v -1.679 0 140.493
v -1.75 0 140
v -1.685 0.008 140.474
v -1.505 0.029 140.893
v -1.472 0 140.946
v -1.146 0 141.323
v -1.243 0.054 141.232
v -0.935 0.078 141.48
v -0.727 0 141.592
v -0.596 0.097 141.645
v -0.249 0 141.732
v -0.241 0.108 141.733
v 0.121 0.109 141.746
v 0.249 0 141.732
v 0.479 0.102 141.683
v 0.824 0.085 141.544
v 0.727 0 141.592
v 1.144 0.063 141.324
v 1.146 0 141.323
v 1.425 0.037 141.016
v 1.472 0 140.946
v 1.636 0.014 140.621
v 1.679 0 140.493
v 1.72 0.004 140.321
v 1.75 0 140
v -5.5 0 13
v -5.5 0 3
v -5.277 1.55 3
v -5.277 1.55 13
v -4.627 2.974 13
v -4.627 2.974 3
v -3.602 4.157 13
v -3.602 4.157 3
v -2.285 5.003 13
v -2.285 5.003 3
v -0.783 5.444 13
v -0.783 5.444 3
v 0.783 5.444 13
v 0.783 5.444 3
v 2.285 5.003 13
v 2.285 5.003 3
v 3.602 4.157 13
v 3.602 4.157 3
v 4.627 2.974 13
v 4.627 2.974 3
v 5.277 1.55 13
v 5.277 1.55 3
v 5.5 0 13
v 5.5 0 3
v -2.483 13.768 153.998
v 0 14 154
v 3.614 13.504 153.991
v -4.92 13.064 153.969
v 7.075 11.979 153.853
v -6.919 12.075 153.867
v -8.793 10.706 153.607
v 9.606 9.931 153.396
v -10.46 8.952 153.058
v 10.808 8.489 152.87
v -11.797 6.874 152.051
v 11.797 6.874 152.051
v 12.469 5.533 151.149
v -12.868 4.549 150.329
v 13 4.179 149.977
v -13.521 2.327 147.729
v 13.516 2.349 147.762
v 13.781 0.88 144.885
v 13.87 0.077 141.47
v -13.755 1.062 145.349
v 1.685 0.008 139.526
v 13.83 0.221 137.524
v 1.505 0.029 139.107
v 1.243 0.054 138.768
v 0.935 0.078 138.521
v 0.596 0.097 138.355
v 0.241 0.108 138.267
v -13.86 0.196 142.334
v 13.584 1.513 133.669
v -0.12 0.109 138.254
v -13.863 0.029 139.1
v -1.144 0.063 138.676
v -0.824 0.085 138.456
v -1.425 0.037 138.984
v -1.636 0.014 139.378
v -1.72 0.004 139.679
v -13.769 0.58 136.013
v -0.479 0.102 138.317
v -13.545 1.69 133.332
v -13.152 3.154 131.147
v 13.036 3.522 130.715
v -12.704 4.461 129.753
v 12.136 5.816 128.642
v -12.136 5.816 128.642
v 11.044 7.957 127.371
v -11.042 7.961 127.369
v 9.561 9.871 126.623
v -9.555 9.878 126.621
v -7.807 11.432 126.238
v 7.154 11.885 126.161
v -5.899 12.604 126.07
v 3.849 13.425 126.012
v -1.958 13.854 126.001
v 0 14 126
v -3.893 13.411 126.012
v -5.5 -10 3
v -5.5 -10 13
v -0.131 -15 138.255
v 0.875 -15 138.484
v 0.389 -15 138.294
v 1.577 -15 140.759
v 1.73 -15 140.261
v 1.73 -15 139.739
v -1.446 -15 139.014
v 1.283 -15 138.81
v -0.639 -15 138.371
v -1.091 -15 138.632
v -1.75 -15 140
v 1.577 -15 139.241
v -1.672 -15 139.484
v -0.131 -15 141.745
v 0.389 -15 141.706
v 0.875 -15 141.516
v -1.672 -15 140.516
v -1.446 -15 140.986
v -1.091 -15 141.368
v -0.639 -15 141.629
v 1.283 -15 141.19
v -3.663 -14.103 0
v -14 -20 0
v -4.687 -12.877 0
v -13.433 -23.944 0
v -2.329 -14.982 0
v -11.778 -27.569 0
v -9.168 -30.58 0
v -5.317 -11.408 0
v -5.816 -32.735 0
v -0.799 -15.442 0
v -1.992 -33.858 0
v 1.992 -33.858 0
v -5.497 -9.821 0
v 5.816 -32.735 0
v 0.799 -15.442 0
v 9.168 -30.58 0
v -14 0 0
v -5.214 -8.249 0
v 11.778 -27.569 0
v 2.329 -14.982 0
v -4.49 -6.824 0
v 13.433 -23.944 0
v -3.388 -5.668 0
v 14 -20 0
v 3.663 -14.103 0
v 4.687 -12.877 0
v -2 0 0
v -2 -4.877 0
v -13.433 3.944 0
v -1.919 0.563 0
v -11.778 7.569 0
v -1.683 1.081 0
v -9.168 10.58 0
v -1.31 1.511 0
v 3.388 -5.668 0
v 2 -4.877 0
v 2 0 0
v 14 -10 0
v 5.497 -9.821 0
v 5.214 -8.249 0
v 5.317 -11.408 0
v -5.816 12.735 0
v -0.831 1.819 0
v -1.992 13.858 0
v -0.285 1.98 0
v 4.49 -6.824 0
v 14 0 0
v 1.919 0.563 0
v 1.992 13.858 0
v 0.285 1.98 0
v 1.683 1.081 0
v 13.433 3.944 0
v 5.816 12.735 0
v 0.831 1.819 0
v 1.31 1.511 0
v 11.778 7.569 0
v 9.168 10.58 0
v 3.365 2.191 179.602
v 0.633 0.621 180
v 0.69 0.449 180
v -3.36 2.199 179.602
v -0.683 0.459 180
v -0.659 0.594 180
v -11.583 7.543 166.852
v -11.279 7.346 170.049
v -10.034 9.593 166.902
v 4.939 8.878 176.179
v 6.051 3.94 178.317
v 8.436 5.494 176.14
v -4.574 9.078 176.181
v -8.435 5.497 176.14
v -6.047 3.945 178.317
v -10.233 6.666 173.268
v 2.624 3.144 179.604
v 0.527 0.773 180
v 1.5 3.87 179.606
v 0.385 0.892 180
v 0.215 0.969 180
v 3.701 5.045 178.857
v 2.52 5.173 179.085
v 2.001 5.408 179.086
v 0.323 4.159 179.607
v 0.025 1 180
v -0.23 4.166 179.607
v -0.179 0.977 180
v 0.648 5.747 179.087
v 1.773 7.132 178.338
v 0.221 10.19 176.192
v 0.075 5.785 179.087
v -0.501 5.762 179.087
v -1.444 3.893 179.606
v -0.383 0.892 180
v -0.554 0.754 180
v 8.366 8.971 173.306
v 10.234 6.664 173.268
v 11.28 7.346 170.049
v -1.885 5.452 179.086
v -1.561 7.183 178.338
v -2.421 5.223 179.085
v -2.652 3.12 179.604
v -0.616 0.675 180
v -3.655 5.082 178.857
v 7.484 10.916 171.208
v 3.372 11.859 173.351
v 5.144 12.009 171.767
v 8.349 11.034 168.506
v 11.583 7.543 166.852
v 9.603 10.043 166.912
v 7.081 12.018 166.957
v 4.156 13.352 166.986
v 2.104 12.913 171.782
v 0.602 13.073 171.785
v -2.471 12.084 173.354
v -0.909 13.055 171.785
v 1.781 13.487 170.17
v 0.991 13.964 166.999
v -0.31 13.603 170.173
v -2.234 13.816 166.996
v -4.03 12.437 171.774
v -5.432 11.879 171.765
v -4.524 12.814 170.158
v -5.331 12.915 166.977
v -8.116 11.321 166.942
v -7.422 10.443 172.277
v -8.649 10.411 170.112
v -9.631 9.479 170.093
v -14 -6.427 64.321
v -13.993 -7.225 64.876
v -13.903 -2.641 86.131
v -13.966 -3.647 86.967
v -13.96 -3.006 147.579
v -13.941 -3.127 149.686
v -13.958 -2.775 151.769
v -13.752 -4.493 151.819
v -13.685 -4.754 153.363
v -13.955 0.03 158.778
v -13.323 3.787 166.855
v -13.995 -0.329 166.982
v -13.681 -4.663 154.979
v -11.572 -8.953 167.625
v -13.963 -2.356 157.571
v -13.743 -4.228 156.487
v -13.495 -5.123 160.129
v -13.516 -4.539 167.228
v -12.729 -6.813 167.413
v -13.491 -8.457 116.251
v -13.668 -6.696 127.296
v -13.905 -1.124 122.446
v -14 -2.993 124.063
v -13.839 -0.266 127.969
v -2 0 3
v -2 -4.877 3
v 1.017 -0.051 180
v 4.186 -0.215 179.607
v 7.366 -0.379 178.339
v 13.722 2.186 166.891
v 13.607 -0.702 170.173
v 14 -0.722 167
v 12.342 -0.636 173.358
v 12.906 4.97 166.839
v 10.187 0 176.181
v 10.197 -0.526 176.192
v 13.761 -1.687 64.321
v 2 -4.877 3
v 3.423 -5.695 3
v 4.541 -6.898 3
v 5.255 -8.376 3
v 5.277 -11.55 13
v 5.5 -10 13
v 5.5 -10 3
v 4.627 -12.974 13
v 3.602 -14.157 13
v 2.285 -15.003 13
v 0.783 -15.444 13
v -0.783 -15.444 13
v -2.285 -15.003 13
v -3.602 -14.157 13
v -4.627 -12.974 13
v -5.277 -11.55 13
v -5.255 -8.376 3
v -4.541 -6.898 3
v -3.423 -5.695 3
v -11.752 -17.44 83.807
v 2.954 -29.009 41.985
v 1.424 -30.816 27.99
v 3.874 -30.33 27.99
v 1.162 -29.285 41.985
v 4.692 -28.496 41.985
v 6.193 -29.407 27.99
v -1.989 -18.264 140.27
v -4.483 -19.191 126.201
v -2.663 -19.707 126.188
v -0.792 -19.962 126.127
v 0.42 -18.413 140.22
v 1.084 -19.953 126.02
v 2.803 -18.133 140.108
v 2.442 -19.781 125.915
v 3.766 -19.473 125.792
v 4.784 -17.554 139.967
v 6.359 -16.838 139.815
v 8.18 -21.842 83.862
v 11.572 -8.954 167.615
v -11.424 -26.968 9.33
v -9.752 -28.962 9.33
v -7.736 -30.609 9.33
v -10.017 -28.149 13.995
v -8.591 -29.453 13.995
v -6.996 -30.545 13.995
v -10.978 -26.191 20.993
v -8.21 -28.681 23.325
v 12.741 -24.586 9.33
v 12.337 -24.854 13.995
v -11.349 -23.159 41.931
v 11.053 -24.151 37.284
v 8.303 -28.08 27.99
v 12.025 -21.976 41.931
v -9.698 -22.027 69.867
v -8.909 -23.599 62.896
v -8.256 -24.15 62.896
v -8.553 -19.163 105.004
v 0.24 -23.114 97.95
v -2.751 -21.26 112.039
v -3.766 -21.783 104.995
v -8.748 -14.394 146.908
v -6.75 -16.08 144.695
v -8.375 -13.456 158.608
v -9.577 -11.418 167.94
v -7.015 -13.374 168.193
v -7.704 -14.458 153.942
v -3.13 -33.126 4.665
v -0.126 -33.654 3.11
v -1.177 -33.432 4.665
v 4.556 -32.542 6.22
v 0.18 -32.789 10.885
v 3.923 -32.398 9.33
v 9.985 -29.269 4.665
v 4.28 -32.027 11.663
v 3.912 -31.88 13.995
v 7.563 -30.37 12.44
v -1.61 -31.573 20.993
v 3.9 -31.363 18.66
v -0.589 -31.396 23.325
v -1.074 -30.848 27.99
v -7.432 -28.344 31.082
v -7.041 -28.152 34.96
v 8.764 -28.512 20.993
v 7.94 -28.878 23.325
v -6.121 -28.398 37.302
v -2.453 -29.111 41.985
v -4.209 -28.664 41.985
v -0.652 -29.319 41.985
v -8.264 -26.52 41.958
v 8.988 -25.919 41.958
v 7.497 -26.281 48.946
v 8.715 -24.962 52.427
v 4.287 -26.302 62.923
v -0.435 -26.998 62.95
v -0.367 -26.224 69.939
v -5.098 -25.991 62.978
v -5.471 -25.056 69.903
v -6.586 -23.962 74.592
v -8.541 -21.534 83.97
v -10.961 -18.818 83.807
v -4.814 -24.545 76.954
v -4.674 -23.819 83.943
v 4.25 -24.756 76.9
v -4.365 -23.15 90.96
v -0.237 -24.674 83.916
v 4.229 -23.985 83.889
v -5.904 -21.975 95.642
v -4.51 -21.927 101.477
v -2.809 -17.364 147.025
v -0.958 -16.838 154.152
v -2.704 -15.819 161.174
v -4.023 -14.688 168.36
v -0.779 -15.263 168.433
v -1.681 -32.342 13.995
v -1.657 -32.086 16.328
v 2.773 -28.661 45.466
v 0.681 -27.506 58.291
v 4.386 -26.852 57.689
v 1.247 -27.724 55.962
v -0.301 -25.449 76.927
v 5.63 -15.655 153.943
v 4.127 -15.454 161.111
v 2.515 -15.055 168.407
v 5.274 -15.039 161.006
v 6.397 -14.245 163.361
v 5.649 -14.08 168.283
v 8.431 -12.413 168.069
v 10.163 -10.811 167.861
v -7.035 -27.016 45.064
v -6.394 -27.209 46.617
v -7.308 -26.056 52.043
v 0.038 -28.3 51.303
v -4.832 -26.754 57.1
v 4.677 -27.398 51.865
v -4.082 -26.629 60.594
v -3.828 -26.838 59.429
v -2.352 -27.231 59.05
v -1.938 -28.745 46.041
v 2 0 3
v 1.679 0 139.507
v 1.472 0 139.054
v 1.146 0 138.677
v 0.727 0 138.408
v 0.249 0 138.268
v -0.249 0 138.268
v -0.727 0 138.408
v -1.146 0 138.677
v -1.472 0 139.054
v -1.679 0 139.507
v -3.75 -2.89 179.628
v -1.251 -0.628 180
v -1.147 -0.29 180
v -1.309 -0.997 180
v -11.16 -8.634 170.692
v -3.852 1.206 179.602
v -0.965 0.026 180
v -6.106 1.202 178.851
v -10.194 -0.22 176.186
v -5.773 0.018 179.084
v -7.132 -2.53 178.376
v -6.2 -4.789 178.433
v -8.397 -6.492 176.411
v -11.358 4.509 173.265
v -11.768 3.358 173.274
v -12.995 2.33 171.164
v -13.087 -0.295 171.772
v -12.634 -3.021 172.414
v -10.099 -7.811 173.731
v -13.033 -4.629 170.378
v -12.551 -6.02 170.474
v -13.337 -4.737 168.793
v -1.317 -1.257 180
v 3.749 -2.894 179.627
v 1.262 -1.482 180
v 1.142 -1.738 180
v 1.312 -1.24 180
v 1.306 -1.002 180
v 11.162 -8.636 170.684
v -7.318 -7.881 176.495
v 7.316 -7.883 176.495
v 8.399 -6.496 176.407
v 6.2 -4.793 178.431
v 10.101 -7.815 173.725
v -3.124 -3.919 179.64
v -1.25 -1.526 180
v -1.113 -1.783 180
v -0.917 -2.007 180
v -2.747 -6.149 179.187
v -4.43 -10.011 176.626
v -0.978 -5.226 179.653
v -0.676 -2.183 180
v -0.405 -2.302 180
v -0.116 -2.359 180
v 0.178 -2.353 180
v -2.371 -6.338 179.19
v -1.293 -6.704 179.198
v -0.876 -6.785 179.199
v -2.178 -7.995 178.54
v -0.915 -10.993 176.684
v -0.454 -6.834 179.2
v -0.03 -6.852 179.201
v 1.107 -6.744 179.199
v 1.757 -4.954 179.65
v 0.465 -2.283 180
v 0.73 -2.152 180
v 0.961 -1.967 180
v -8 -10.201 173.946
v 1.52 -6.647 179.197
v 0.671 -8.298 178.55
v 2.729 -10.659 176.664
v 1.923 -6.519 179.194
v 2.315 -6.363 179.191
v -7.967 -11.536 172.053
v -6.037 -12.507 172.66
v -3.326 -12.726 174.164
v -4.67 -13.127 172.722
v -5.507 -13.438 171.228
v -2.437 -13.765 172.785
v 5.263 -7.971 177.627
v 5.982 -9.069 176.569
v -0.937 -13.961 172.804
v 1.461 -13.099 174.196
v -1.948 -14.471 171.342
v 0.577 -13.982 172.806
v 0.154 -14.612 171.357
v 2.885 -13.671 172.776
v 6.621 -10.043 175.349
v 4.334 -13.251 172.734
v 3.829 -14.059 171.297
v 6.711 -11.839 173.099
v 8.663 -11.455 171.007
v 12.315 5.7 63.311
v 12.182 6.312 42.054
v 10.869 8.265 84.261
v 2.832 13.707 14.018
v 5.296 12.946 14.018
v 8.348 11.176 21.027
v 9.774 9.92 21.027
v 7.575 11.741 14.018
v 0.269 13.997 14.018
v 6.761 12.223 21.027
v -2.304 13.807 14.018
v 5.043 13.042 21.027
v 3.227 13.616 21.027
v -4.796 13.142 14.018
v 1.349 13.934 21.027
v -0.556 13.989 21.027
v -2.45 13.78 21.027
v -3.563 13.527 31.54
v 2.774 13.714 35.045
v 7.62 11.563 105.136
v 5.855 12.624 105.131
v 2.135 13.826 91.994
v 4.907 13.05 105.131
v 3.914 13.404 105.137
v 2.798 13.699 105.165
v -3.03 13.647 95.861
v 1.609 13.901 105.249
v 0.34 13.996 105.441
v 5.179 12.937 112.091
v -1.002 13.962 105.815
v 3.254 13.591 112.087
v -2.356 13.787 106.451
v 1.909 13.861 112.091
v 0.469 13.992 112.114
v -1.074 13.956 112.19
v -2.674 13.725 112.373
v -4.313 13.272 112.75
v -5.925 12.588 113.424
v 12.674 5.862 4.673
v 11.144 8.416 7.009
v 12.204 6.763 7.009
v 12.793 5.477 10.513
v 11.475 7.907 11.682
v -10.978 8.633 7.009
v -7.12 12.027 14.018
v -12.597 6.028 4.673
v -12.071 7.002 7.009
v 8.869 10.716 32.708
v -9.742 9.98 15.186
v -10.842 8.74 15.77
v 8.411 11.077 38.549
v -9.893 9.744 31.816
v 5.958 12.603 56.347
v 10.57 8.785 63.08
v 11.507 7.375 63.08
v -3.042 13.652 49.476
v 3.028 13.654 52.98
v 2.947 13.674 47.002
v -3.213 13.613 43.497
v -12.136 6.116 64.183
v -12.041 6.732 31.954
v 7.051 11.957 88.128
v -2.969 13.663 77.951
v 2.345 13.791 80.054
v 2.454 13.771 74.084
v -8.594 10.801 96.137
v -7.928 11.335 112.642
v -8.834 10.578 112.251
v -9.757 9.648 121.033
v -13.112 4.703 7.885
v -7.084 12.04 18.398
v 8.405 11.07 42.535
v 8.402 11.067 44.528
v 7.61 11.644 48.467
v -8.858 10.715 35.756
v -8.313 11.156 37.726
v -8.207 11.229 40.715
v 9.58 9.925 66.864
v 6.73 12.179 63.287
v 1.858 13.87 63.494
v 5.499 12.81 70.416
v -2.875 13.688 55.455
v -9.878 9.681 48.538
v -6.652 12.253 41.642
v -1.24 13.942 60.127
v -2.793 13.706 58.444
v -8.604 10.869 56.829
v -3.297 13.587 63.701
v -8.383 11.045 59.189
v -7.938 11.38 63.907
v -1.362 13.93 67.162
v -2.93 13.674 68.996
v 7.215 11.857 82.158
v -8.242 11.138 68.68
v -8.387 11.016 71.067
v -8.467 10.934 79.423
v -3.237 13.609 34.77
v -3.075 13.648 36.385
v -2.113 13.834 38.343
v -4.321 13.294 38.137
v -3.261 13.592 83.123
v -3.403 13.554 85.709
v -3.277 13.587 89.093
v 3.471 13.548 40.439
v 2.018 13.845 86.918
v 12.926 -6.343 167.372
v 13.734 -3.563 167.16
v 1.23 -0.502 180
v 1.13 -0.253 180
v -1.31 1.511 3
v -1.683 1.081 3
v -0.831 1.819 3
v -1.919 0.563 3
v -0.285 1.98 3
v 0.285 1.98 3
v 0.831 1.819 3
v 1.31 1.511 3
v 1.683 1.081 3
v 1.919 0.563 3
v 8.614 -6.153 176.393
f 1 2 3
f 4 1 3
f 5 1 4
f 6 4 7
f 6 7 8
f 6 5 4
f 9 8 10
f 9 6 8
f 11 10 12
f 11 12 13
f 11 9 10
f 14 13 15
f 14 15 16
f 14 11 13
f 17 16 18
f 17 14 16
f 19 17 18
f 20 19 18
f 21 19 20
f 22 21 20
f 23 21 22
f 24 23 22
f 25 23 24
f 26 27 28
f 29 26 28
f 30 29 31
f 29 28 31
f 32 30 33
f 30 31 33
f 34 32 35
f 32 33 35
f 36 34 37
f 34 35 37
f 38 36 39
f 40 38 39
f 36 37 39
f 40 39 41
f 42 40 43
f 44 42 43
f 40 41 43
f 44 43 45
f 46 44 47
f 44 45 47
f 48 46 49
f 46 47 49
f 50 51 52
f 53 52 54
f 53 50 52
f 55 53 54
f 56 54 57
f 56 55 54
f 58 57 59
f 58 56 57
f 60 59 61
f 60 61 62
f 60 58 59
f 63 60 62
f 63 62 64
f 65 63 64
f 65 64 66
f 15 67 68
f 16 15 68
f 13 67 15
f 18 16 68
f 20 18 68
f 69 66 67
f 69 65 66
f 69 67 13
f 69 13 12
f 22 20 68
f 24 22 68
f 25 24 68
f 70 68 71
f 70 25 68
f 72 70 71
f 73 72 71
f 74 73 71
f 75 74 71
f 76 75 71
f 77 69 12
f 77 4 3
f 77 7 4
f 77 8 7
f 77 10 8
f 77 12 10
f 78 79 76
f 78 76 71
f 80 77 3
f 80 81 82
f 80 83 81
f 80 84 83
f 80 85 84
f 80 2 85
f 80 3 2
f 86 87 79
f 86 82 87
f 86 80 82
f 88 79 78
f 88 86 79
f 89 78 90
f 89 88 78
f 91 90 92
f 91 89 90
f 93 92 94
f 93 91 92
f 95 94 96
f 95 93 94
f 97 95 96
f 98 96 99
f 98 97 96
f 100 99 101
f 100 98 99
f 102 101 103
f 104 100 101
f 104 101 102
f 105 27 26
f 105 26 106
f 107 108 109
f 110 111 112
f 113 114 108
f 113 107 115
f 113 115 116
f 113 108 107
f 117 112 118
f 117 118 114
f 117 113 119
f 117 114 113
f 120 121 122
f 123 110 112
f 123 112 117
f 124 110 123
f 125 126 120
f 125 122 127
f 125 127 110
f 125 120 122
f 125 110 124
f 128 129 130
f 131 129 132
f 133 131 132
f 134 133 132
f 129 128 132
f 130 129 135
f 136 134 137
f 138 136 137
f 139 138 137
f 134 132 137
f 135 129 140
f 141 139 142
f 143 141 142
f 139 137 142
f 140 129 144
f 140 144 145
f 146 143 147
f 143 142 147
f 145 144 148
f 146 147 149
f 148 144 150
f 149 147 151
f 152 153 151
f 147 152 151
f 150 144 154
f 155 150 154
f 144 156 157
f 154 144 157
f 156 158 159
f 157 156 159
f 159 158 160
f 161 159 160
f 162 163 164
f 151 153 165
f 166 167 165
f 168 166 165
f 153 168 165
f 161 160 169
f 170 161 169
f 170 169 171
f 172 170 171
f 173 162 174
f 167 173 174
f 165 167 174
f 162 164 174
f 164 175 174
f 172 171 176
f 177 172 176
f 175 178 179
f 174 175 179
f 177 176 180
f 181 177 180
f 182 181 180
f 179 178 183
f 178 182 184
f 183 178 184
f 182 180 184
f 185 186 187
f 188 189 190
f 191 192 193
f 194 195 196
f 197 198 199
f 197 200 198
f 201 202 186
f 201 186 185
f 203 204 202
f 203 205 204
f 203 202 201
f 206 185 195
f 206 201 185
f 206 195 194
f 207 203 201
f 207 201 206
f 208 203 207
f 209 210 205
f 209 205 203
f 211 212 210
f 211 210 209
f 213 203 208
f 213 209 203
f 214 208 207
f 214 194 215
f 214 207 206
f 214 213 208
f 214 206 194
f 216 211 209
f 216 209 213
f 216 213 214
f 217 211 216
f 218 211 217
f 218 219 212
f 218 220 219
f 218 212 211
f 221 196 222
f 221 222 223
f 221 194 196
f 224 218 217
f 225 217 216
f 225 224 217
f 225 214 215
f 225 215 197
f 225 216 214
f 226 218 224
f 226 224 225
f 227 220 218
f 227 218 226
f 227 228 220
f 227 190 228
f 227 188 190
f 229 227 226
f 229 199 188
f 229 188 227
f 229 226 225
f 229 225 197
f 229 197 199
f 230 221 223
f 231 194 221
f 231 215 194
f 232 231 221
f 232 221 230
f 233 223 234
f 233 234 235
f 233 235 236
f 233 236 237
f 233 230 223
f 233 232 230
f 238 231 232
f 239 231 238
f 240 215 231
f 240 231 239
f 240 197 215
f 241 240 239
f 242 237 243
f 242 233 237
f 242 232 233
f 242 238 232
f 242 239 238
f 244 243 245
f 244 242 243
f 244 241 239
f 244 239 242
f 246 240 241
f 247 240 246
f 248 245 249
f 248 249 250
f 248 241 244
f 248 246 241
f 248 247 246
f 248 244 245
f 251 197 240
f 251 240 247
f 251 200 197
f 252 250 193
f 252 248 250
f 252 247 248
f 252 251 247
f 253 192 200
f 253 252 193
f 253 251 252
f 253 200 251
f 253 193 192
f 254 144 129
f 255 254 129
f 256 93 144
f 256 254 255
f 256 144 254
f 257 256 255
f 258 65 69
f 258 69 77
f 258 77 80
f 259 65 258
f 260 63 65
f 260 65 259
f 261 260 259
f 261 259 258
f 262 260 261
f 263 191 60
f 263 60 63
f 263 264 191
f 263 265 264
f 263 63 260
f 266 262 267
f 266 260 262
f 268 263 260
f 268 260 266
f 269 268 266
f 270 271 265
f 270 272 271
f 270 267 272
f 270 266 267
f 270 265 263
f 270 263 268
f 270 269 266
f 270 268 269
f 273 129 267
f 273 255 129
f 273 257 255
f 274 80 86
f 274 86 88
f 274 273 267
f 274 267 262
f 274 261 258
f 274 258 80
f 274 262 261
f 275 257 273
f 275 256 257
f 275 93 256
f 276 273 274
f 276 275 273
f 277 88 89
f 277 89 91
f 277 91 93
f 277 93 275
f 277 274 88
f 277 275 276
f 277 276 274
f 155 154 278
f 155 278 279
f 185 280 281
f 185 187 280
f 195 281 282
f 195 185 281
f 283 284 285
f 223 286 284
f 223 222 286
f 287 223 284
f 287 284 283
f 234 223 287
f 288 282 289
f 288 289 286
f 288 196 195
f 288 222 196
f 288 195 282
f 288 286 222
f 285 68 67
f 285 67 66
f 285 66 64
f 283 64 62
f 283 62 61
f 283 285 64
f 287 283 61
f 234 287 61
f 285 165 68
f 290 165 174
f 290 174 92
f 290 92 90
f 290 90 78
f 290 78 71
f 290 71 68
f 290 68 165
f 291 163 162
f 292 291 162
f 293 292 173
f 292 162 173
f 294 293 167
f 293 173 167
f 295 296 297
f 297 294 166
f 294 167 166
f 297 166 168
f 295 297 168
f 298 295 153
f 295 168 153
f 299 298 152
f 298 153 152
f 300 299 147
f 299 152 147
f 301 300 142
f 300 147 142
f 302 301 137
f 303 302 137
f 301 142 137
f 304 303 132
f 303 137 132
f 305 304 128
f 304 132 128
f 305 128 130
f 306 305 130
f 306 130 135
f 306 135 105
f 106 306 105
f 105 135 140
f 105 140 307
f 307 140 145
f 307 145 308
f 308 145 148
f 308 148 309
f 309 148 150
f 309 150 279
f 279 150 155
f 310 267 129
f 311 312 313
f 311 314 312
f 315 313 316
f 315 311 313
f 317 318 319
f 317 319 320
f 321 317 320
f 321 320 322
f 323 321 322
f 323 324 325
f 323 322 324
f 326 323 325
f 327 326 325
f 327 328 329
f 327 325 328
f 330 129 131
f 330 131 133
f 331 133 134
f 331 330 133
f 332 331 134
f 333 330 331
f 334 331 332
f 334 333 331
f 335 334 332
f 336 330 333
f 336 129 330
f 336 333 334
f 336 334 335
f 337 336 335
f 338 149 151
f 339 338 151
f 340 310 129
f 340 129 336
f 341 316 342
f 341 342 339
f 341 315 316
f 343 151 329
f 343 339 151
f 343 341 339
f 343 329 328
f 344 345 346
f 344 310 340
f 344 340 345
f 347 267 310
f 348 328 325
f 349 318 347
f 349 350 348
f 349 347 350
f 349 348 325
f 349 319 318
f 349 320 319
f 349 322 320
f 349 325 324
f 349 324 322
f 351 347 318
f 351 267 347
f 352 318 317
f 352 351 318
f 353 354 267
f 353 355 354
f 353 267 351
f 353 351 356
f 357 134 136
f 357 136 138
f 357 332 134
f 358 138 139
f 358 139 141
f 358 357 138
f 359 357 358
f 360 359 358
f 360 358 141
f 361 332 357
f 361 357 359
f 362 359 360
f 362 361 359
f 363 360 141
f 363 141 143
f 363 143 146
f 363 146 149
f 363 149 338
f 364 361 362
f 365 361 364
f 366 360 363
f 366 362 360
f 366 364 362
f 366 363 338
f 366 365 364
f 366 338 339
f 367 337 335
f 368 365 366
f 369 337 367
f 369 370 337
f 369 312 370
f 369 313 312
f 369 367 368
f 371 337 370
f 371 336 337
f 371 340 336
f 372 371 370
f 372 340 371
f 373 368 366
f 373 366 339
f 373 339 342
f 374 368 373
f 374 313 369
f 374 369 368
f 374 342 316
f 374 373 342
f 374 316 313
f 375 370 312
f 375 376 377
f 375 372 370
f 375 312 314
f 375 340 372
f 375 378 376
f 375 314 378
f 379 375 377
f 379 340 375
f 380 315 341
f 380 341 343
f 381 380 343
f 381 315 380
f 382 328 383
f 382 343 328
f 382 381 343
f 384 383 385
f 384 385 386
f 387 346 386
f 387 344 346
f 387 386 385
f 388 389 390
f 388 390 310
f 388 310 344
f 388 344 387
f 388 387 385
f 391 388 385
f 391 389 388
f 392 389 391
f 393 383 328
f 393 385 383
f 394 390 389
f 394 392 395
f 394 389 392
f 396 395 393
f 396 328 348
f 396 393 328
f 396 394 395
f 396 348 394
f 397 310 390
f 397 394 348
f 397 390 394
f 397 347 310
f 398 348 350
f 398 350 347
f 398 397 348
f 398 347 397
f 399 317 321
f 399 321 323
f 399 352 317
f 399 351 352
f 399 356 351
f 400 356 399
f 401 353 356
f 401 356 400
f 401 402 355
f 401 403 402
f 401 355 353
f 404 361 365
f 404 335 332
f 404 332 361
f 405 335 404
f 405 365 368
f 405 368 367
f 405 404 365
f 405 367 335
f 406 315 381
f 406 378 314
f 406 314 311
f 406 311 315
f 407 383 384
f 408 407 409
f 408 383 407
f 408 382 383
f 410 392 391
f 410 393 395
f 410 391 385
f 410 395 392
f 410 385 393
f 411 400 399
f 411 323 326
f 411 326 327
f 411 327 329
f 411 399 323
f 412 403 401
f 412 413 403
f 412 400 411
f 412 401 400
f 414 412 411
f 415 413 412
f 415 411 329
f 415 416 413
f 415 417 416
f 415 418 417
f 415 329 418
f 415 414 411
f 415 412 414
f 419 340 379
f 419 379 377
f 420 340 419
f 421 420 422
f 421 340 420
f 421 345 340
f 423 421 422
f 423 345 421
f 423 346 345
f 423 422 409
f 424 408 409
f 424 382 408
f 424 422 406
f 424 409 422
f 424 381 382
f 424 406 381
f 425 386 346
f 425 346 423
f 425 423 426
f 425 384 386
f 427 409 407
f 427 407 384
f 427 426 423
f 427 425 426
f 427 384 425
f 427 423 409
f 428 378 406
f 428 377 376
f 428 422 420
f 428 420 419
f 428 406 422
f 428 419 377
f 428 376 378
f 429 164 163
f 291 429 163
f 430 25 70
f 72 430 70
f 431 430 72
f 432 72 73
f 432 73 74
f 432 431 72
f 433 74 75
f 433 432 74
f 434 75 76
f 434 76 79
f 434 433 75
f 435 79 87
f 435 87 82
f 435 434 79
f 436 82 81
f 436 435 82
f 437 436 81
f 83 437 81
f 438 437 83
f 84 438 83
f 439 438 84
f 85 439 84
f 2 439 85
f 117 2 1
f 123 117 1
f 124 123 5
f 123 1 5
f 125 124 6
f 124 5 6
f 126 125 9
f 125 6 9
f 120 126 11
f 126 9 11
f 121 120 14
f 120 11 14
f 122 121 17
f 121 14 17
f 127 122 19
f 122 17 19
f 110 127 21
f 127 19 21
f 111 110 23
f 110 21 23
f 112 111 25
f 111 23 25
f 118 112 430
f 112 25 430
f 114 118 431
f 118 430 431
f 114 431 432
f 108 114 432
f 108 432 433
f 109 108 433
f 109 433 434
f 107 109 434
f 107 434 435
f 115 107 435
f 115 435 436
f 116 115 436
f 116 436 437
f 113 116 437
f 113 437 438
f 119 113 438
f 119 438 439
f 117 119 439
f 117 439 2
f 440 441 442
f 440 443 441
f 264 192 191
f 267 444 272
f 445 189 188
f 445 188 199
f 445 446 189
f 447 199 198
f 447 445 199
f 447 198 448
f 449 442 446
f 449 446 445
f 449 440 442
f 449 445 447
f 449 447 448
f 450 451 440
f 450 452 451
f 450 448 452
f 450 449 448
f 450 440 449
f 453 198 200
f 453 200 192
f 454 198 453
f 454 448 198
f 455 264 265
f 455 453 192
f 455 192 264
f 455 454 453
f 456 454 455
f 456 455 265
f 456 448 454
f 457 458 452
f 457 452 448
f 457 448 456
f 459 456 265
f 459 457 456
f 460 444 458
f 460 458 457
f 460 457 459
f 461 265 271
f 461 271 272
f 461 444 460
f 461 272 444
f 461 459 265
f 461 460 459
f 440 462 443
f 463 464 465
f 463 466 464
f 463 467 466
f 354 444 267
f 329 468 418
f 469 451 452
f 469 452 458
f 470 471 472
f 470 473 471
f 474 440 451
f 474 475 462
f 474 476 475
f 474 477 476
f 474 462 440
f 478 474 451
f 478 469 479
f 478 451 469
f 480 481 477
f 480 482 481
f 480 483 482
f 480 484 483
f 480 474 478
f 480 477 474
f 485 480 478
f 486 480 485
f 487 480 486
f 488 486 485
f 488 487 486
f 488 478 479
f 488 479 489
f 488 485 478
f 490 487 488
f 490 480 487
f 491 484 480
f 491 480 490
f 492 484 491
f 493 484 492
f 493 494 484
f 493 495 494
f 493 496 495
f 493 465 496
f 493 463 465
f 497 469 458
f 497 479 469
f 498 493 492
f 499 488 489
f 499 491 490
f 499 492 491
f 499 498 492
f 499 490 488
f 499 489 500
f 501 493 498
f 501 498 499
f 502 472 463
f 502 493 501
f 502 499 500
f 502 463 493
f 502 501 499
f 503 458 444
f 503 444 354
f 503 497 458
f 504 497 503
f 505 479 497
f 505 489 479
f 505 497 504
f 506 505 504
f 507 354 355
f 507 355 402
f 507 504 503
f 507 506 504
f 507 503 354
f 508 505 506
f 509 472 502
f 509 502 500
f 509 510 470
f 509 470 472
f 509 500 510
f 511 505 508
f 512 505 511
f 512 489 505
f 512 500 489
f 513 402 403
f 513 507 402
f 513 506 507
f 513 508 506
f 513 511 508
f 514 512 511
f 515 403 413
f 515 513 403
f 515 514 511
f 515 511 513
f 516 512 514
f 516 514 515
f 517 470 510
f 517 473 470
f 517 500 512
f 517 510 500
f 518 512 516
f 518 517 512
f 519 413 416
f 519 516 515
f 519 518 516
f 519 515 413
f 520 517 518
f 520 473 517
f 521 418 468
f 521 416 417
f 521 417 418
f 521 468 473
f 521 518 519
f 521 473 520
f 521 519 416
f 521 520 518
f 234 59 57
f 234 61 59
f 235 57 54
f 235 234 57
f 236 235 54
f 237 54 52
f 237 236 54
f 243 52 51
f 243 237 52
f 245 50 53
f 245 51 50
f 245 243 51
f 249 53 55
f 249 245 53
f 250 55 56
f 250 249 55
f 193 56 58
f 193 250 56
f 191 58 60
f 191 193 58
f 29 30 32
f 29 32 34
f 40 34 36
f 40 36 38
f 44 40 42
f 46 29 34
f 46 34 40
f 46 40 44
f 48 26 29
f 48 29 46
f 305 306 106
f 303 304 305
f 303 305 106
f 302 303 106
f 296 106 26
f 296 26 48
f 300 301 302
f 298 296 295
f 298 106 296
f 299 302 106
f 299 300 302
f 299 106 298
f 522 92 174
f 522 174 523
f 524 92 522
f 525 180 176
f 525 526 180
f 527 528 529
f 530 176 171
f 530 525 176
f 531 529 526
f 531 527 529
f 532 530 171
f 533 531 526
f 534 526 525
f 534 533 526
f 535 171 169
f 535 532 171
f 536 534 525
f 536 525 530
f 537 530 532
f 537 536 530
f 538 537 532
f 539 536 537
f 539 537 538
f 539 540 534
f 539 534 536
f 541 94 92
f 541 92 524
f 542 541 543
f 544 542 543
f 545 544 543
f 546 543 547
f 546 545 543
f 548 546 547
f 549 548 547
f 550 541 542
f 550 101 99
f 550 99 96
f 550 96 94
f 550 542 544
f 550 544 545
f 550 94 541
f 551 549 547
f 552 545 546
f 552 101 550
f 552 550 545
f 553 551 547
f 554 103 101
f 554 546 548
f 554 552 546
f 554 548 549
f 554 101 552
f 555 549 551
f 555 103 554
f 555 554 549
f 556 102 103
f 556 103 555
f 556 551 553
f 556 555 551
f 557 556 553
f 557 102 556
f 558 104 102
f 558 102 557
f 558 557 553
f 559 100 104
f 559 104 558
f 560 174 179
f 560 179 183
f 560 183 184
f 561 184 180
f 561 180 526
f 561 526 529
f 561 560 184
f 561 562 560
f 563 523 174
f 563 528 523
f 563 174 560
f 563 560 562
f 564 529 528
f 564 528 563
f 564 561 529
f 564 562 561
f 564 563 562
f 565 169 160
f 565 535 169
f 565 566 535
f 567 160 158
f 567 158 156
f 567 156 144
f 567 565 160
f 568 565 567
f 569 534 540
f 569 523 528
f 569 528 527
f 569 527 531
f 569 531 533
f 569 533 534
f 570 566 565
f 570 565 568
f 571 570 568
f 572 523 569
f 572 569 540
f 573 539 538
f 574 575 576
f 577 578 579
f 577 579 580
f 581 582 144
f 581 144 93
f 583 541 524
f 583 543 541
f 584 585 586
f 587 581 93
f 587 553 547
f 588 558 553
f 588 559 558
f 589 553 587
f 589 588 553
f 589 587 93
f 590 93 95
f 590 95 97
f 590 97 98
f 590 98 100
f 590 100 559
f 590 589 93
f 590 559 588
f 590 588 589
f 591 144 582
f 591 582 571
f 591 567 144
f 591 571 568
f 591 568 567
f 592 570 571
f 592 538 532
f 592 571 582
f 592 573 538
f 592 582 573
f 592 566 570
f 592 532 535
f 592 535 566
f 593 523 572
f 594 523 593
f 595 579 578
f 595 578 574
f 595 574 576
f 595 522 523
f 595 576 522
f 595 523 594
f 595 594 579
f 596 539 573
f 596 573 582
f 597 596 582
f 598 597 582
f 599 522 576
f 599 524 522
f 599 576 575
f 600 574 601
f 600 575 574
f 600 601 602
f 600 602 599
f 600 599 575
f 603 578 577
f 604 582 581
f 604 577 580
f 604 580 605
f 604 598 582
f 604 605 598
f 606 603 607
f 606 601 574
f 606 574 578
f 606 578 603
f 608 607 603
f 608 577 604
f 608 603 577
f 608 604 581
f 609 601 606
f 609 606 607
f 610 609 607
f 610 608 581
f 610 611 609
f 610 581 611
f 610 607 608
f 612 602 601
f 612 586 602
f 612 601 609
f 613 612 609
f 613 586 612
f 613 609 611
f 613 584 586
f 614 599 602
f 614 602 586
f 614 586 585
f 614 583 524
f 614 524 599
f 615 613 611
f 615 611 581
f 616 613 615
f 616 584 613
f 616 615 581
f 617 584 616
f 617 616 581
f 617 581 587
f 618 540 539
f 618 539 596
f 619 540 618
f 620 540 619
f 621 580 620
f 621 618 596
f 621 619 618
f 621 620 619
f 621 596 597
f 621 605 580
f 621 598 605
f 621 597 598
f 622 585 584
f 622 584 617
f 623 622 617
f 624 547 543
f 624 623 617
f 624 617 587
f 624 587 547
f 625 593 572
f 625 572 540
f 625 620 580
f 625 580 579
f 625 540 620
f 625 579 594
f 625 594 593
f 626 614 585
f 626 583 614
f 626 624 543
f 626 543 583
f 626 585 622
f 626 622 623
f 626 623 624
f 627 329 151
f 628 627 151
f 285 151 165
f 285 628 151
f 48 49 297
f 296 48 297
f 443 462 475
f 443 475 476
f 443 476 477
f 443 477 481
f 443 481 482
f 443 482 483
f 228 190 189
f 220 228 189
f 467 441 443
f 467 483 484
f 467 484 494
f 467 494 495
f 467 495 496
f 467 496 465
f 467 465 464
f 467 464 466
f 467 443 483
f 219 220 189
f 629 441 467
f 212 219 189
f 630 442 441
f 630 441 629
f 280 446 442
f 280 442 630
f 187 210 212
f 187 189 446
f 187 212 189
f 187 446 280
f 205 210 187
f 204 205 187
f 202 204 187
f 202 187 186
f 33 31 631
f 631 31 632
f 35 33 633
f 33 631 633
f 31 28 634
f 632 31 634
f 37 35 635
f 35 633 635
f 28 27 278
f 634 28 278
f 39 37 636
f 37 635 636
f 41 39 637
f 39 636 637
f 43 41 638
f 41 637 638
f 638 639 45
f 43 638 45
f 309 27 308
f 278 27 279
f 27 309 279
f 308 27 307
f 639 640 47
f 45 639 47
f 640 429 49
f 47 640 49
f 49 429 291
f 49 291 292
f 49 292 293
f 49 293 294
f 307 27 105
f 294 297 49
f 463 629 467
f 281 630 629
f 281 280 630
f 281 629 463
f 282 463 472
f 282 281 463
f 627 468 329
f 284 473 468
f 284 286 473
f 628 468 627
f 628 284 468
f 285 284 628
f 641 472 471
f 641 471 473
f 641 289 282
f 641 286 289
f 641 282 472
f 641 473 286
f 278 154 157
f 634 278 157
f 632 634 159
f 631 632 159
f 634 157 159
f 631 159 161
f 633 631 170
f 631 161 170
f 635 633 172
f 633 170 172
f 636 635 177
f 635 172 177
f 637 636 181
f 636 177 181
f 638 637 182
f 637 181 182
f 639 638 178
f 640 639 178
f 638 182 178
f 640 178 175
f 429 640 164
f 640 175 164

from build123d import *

# Parameters (mm, degrees)
SKETCH001_R          = 14
SKETCH002_R          = 14
POCKET_DEPTH         = 14.001
POCKET_DEPTH_BACK    = -14.001
SKETCH003_R          = 1.75
POCKET001_DEPTH      = 15
POCKET001_DEPTH_BACK = -5
POCKET002_DEPTH      = 10
SKETCH005_R          = 5.5
POCKET003_DEPTH      = 3
FILLET_R             = 13


with BuildPart() as part:
    # Sketch → AdditiveLoft section 0
    with BuildSketch(Plane.XY):
        with BuildLine():
            ThreePointArc((14, 0), (0, 14), (-14, 0))
            Line((-14, 0), (-14, -20))
            ThreePointArc((-14, -20), (0, -34), (14, -20))
            Line((14, 0), (14, -20))
        make_face()
    # Sketch001 (on DatumPlane) → AdditiveLoft section 1
    with BuildSketch(Plane.XY.offset(180)):
        Circle(SKETCH001_R)
    loft()

    # Sketch002 (on DatumPlane) → Pocket (cut, two sides)
    with BuildSketch(Plane.YZ) as pocket_sk:
        with Locations((14, 140)):
            Circle(SKETCH002_R)
    extrude(amount=-POCKET_DEPTH, mode=Mode.SUBTRACT)
    extrude(pocket_sk.sketch, amount=-POCKET_DEPTH_BACK, mode=Mode.SUBTRACT)

    # Sketch003 (on DatumPlane) → Pocket001 (cut, two sides)
    with BuildSketch(Plane(origin=(0, 0, 0), x_dir=(-1, 0, 0), z_dir=(0, 1, 0))) as pocket001_sk:
        with Locations((0, 140)):
            Circle(SKETCH003_R)
    extrude(amount=-POCKET001_DEPTH, mode=Mode.SUBTRACT)
    extrude(pocket001_sk.sketch, amount=-POCKET001_DEPTH_BACK, mode=Mode.SUBTRACT)

    # Sketch004 (on DatumPlane) → Pocket002 (cut)
    with BuildSketch(Plane(origin=(0, 0, 3), x_dir=(1, 0, 0), z_dir=(0, 0, -1))):
        with BuildLine():
            ThreePointArc((-5.5, 0), (0, -5.5), (5.5, 0))
            Line((5.5, 0), (5.5, 10))
            ThreePointArc((5.5, 10), (0, 15.5), (-5.5, 10))
            Line((-5.5, 0), (-5.5, 10))
        make_face()
    extrude(amount=-POCKET002_DEPTH, mode=Mode.SUBTRACT)

    # Sketch005 (on Face1 of Pocket002) → Pocket003 (cut)
    with BuildSketch(Plane(origin=(0, 0, 0), x_dir=(1, 0, 0), z_dir=(0, 0, -1))):
        with Locations((0, 10)):
            Circle(SKETCH005_R)
        with BuildLine():
            ThreePointArc((-2, 0), (0, -2), (2, 0))
            Line((2, 0), (2, 10))
            ThreePointArc((2, 10), (0, 12), (-2, 10))
            Line((-2, 0), (-2, 10))
        make_face()
    extrude(amount=-POCKET003_DEPTH, mode=Mode.SUBTRACT)

    # Fillet
    fillet_edges = [part.edges().sort_by_distance(p)[0] for p in [
        (0, 14, 180),
        (-14, 0, 180),
        (0, -14, 180),
        (13.332137, -4.272484, 180),
        (13.332137, 4.272484, 180),
    ]]
    fillet(fillet_edges, radius=FILLET_R)


solid = part.part
